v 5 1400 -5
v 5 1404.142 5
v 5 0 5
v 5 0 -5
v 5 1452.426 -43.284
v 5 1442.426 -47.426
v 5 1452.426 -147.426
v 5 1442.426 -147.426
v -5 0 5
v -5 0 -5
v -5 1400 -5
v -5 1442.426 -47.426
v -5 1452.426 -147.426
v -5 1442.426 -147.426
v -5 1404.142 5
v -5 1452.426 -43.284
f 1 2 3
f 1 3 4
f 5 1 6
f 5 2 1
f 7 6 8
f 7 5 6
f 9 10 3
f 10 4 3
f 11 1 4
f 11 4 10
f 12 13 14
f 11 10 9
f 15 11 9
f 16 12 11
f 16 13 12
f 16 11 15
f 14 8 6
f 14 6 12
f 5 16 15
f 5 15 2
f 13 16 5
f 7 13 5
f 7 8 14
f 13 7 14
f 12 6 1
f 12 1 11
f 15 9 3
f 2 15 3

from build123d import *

# Parameters (mm, degrees)
SKETCH_1_W = 10
SKETCH_1_H = 10


with BuildPart() as part:
    # 扫描2: sweep along a path in 草图3
    with BuildLine(Plane(origin=(0, 0, 0), x_dir=(0, 0, -1), z_dir=(1, 0, 0))) as sweep_2_path:
        Line((5, 0), (5, 1400))
        Line((5, 1400), (47.426406871, 1442.426406871))
        Line((47.426406871, 1442.426406871), (147.426406871, 1442.426406871))
    # 草图1 → 扫描2 (sweep)
    with BuildSketch(Plane(origin=(0, 0, 0), x_dir=(1, 0, 0), z_dir=(0, 1, 0))):
        Rectangle(SKETCH_1_W, SKETCH_1_H)
    sweep(path=sweep_2_path.line, transition=Transition.RIGHT)


solid = part.part
